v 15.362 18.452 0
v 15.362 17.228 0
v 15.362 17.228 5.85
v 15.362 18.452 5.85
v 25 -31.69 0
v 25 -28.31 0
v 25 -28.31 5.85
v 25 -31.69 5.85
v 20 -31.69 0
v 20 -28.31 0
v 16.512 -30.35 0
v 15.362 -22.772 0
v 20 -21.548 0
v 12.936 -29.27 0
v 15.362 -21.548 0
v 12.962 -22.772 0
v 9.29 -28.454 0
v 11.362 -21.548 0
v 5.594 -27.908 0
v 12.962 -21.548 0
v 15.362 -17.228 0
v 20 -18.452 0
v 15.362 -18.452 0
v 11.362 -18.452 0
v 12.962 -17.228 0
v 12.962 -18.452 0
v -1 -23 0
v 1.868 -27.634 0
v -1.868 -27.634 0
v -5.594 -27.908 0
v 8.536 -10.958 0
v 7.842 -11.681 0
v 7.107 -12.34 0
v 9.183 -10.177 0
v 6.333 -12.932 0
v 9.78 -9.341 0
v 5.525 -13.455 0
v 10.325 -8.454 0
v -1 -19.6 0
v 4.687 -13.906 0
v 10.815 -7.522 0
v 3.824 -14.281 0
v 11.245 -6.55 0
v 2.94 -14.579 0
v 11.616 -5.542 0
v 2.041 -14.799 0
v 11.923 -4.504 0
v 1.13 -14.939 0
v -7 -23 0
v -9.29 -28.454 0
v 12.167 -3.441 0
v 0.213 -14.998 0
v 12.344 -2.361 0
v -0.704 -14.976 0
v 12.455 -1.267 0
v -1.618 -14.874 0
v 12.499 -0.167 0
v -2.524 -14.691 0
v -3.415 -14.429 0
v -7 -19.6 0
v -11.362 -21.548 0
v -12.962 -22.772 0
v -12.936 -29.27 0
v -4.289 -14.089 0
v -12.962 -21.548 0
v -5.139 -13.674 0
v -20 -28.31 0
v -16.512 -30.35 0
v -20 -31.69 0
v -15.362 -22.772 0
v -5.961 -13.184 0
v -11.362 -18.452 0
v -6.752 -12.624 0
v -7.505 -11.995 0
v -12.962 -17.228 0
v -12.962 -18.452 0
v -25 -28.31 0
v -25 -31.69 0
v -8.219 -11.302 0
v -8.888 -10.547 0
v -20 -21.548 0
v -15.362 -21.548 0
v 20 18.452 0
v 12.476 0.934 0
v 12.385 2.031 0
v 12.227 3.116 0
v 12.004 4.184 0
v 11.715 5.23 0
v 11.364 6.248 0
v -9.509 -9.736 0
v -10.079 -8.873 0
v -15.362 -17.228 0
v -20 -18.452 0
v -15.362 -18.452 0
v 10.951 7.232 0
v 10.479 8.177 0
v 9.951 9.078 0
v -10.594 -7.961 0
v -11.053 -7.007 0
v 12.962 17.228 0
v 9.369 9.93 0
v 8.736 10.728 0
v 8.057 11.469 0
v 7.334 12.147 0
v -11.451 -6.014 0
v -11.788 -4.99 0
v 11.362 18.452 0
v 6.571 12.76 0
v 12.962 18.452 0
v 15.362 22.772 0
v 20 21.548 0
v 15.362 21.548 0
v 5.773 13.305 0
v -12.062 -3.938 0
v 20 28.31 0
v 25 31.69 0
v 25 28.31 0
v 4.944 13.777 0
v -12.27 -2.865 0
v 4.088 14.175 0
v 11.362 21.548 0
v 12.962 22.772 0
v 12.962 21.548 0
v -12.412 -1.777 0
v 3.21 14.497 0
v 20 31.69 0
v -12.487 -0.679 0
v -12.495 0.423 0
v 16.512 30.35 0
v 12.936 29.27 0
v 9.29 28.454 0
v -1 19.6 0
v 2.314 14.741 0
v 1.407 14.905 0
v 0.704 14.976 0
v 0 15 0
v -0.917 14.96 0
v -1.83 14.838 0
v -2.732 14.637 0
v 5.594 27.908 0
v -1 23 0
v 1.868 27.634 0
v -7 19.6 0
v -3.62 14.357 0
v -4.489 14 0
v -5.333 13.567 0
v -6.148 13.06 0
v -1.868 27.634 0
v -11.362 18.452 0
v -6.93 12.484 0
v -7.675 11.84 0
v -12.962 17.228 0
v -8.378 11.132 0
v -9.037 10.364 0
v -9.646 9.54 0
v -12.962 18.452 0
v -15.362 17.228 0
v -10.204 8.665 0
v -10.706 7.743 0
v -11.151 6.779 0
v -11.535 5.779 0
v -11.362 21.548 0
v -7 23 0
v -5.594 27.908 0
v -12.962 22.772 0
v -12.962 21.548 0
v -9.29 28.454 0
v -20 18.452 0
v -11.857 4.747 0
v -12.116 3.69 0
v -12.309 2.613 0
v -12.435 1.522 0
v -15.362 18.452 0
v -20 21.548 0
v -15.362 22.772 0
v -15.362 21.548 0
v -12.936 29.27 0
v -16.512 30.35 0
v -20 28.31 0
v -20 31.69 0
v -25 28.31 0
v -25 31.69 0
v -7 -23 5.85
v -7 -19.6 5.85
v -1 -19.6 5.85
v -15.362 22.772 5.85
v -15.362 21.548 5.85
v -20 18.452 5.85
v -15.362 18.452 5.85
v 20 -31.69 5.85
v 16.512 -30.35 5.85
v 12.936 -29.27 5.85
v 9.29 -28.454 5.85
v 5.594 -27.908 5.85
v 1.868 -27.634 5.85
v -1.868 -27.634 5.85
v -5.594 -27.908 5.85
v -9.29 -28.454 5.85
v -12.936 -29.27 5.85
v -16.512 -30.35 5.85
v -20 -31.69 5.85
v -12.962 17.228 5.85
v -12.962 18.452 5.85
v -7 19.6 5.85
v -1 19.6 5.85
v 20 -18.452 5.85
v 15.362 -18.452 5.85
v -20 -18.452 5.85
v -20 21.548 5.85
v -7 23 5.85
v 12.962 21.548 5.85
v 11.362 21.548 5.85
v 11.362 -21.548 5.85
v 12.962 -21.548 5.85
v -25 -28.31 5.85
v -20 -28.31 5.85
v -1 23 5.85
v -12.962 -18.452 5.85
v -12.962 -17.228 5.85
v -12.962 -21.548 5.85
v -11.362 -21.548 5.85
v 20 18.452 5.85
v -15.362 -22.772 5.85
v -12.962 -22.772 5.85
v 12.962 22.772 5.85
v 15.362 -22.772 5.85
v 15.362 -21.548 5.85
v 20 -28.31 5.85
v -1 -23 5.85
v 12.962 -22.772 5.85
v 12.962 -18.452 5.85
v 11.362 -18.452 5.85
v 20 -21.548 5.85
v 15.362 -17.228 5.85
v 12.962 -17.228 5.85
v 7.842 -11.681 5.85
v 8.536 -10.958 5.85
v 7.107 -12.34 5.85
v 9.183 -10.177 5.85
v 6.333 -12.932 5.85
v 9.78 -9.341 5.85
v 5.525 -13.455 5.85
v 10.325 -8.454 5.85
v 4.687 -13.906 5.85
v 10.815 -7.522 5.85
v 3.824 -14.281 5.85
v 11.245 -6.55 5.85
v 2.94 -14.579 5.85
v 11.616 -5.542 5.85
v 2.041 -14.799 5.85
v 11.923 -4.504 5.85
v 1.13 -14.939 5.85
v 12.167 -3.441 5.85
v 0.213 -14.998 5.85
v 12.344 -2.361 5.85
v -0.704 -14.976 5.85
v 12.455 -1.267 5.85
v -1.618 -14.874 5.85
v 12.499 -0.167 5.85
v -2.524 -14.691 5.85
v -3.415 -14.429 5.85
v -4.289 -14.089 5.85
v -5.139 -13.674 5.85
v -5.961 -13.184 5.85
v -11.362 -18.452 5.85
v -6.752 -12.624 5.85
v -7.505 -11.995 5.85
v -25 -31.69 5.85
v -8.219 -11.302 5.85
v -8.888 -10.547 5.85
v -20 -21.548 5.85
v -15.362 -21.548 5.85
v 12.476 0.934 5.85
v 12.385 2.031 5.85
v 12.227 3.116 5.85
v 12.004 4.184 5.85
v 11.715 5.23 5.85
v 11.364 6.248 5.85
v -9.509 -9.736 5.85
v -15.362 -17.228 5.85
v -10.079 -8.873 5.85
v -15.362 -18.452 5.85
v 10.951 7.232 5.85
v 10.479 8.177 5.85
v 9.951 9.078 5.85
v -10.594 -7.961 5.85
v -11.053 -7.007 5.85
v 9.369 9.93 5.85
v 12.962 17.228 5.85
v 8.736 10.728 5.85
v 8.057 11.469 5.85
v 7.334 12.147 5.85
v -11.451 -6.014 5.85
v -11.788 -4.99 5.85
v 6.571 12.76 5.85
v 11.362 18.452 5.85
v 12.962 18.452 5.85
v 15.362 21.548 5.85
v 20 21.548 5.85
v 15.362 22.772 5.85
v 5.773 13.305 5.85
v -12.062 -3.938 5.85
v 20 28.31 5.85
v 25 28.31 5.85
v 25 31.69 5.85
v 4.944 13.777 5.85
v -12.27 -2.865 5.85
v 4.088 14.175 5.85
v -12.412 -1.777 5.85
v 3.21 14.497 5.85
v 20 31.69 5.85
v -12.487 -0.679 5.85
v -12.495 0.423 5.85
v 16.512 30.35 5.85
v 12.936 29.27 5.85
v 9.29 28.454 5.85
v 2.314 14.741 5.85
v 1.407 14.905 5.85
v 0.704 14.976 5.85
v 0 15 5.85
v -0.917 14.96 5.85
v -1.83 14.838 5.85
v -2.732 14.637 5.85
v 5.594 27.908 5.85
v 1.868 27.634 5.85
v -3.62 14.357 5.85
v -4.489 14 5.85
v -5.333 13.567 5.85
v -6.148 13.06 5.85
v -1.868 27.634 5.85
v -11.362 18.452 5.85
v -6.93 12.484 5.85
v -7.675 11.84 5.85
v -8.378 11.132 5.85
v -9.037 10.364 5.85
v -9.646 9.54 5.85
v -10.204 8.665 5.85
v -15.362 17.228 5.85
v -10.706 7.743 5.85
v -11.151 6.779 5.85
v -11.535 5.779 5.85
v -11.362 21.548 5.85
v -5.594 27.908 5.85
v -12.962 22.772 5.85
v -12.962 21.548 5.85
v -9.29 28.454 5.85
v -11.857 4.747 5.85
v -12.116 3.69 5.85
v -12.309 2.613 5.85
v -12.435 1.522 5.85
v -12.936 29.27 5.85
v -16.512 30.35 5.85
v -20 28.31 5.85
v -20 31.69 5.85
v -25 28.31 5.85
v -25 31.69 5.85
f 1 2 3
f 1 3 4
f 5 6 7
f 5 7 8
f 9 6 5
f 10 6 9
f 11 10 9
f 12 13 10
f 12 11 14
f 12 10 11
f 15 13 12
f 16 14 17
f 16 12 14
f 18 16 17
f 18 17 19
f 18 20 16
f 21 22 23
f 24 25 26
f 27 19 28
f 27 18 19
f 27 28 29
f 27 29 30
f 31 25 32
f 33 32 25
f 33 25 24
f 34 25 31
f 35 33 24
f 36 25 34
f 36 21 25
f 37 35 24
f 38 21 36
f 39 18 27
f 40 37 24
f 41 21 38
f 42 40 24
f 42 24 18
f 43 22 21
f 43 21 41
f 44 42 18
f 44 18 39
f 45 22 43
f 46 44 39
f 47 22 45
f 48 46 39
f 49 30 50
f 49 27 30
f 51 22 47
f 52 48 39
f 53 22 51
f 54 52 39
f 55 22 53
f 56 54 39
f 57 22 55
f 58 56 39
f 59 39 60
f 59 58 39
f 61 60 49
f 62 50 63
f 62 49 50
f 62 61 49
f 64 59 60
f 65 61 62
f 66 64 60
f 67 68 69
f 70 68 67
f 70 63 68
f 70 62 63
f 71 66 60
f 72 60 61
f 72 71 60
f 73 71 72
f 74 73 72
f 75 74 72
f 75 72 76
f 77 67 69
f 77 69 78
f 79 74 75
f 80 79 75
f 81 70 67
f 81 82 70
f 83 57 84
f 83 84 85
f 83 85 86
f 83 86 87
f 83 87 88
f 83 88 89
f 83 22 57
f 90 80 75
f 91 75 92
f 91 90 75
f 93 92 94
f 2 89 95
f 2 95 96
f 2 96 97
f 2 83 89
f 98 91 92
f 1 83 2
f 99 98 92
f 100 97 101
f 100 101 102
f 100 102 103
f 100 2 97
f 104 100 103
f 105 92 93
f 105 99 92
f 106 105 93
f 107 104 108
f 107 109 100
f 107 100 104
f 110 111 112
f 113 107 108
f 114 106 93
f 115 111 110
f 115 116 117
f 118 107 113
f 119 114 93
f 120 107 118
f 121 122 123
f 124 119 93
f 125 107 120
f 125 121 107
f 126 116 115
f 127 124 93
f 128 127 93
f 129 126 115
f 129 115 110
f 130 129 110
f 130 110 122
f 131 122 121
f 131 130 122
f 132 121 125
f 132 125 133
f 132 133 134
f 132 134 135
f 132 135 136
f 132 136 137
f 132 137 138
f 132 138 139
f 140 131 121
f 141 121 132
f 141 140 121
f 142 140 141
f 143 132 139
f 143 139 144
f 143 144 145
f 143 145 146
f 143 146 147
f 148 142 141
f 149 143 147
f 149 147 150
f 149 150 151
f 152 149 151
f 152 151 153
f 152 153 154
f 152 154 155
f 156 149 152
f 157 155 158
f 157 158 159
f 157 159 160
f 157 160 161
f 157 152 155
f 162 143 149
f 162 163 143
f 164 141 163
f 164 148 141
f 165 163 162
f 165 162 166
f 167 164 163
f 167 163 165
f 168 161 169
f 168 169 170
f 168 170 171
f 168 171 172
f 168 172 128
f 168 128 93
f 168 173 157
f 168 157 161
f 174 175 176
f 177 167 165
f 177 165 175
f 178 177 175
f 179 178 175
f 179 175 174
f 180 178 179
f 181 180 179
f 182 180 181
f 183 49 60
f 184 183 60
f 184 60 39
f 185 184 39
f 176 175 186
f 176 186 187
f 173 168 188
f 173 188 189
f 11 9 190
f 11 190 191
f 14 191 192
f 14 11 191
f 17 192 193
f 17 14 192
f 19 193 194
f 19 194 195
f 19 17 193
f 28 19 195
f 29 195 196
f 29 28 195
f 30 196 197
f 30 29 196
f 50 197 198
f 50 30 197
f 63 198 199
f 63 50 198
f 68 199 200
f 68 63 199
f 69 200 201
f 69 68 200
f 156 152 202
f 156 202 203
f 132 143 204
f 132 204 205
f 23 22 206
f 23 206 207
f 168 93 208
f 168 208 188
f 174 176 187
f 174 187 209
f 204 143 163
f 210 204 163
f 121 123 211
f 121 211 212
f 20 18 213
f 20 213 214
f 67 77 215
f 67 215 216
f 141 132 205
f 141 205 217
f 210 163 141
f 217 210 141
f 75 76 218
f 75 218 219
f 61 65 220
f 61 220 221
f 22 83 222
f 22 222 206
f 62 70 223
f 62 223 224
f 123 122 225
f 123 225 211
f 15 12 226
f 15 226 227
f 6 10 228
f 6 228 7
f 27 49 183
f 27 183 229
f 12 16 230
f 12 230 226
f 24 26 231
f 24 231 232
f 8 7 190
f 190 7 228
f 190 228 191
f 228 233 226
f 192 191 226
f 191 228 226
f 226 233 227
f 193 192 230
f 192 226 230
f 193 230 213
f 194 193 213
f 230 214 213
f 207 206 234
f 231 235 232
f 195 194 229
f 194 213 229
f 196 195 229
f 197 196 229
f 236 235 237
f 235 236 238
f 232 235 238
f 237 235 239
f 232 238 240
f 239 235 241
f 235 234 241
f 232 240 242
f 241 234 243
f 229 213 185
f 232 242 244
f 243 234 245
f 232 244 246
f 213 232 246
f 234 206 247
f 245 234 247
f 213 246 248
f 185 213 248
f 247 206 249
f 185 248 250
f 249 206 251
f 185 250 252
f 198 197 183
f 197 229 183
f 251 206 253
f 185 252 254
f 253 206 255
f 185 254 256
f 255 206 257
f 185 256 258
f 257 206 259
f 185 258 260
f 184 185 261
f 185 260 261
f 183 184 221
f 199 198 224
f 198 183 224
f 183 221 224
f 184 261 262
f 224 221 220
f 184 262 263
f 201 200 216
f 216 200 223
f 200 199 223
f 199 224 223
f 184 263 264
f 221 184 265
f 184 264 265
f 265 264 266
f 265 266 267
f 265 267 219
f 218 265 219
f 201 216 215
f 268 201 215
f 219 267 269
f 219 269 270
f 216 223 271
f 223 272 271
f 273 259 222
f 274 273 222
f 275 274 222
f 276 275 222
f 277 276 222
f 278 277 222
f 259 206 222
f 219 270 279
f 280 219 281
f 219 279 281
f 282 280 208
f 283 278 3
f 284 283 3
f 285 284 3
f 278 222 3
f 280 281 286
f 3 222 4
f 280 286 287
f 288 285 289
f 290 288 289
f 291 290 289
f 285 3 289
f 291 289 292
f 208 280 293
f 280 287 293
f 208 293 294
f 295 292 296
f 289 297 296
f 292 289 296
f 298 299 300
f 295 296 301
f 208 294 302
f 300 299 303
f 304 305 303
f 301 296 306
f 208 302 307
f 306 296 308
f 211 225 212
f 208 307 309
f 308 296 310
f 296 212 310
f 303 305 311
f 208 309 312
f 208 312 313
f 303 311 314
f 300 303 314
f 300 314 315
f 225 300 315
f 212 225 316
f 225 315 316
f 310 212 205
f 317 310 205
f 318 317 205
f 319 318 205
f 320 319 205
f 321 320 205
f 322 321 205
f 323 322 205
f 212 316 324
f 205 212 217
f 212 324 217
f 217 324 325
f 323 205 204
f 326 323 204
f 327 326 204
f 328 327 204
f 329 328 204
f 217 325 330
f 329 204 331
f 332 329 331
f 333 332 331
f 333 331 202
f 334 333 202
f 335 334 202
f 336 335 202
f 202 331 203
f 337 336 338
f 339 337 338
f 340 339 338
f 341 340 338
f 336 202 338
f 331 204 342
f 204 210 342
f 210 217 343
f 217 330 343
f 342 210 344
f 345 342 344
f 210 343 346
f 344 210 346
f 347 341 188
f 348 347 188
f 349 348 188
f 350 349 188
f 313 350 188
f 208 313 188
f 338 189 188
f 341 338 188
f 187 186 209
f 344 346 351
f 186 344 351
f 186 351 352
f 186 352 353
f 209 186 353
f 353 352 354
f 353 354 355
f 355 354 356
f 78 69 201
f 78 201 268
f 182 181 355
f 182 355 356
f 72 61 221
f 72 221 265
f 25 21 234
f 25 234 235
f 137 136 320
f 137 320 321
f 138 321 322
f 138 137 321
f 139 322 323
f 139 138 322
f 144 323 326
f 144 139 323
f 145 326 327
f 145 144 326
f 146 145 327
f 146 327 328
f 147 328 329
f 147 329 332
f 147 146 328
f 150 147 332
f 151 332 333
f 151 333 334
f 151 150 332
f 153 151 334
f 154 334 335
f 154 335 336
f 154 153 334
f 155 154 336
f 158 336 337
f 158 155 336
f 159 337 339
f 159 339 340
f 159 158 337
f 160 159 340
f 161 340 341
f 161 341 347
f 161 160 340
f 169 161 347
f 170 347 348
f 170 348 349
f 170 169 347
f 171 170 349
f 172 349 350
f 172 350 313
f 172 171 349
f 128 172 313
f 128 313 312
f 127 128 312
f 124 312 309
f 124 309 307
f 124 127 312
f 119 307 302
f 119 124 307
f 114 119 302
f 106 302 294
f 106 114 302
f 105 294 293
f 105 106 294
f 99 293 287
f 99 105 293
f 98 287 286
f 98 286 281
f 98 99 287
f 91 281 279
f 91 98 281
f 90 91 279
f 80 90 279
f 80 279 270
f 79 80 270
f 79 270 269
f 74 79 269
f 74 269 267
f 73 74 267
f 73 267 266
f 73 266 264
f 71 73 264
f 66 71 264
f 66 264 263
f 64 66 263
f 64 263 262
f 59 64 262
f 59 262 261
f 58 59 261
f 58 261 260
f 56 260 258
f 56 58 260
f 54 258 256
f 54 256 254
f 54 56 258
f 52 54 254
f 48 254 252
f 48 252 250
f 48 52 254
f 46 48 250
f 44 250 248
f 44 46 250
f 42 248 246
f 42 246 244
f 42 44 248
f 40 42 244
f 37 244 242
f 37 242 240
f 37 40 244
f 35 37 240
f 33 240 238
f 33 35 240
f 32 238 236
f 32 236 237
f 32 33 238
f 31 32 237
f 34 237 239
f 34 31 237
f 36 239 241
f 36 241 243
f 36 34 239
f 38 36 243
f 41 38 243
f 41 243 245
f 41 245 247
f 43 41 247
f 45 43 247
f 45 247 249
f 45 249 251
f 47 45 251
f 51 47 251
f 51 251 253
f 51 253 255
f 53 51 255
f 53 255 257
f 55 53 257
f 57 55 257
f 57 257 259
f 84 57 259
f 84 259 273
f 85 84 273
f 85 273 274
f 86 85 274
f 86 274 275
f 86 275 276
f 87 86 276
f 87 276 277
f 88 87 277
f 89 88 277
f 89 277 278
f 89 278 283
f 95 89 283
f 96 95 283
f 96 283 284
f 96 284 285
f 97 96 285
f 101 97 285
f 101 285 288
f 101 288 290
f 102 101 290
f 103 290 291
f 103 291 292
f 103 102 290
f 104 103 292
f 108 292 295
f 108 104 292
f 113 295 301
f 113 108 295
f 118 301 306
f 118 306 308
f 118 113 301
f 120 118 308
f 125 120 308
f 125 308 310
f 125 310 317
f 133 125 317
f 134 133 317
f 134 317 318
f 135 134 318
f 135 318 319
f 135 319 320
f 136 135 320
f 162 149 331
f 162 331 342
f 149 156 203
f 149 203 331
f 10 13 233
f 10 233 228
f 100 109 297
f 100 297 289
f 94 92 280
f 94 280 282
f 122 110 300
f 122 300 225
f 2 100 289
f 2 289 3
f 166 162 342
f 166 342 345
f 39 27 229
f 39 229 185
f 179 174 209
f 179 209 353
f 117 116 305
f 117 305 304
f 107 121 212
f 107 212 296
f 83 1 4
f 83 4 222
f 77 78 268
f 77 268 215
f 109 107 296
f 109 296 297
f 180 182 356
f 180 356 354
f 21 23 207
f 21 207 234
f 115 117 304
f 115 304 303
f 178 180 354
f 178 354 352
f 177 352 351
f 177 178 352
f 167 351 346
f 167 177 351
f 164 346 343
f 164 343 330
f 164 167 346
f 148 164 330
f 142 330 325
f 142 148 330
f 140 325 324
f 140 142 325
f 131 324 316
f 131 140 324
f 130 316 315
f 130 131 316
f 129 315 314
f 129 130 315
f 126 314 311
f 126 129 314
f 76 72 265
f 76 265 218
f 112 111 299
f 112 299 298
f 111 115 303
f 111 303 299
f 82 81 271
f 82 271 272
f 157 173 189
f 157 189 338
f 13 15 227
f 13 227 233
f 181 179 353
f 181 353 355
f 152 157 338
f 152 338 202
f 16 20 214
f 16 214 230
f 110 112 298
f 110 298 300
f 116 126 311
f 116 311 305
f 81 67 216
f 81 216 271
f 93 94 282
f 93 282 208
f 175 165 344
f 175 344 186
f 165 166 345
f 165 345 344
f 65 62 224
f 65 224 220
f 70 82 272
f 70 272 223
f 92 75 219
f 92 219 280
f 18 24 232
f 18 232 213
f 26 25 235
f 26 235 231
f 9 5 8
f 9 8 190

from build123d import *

# Parameters (mm, degrees)
SKETCH1_RX          = 15
SKETCH1_RY          = 12.5
SKETCH1_W           = 6
SKETCH1_H           = 3.4
BOSS_EXTRUDE1_DEPTH = 5.85


with BuildPart() as part:
    # Sketch1 → Boss-Extrude1 (new body)
    with BuildSketch(Plane.XY):
        with BuildLine():
            Line((12.961794972, -22.772242018), (15.361794972, -22.772242018))
            Line((15.361794972, -22.772242018), (15.361794972, -21.547840006))
            Line((15.361794972, -21.547840006), (20, -21.547840006))
            Line((20, -21.547840006), (20, -28.31))
            Line((20, -28.31), (25, -28.31))
            Line((25, -28.31), (25, -31.69))
            Line((25, -31.69), (20, -31.69))
            ThreePointArc((20, -31.69), (0, -27.6), (-20, -31.69))
            Line((-20, -31.69), (-25, -31.69))
            Line((-25, -31.69), (-25, -28.31))
            Line((-25, -28.31), (-20, -28.31))
            Line((-20, -28.31), (-20, -21.547840006))
            Line((-20, -21.547840006), (-15.361794972, -21.547840006))
            Line((-15.361794972, -21.547840006), (-15.361794972, -22.772242018))
            Line((-15.361794972, -22.772242018), (-12.961794972, -22.772242018))
            Line((-12.961794972, -22.772242018), (-12.961794972, -21.547840006))
            Line((-12.961794972, -21.547840006), (-11.361794972, -21.547840006))
            Line((-11.361794972, -21.547840006), (-11.361794972, -18.452159994))
            Line((-11.361794972, -18.452159994), (-12.961794972, -18.452159994))
            Line((-12.961794972, -18.452159994), (-12.961794972, -17.227757982))
            Line((-12.961794972, -17.227757982), (-15.361794972, -17.227757982))
            Line((-15.361794972, -17.227757982), (-15.361794972, -18.452159994))
            Line((-15.361794972, -18.452159994), (-20, -18.452159994))
            Line((-20, -18.452159994), (-20, 0))
            Line((-20, 0), (-20, 18.452159994))
            Line((-20, 18.452159994), (-15.361794972, 18.452159994))
            Line((-15.361794972, 18.452159994), (-15.361794972, 17.227757982))
            Line((-15.361794972, 17.227757982), (-12.961794972, 17.227757982))
            Line((-12.961794972, 17.227757982), (-12.961794972, 18.452159994))
            Line((-12.961794972, 18.452159994), (-11.361794972, 18.452159994))
            Line((-11.361794972, 18.452159994), (-11.361794972, 21.547840006))
            Line((-11.361794972, 21.547840006), (-12.961794972, 21.547840006))
            Line((-12.961794972, 21.547840006), (-12.961794972, 22.772242018))
            Line((-12.961794972, 22.772242018), (-15.361794972, 22.772242018))
            Line((-15.361794972, 22.772242018), (-15.361794972, 21.547840006))
            Line((-15.361794972, 21.547840006), (-20, 21.547840006))
            Line((-20, 21.547840006), (-20, 28.31))
            Line((-20, 28.31), (-25, 28.31))
            Line((-25, 28.31), (-25, 31.69))
            Line((-25, 31.69), (-20, 31.69))
            ThreePointArc((-20, 31.69), (0, 27.6), (20, 31.69))
            Line((20, 31.69), (25, 31.69))
            Line((25, 31.69), (25, 28.31))
            Line((25, 28.31), (20, 28.31))
            Line((20, 28.31), (20, 21.547840006))
            Line((20, 21.547840006), (15.361794972, 21.547840006))
            Line((15.361794972, 21.547840006), (15.361794972, 22.772242018))
            Line((15.361794972, 22.772242018), (12.961794972, 22.772242018))
            Line((12.961794972, 22.772242018), (12.961794972, 21.547840006))
            Line((12.961794972, 21.547840006), (11.361794972, 21.547840006))
            Line((11.361794972, 21.547840006), (11.361794972, 18.452159994))
            Line((11.361794972, 18.452159994), (12.961794972, 18.452159994))
            Line((12.961794972, 18.452159994), (12.961794972, 17.227757982))
            Line((12.961794972, 17.227757982), (15.361794972, 17.227757982))
            Line((15.361794972, 17.227757982), (15.361794972, 18.452159994))
            Line((15.361794972, 18.452159994), (20, 18.452159994))
            Line((20, 18.452159994), (20, 0))
            Line((20, 0), (20, -18.452159994))
            Line((20, -18.452159994), (15.361794972, -18.452159994))
            Line((15.361794972, -18.452159994), (15.361794972, -17.227757982))
            Line((15.361794972, -17.227757982), (12.961794972, -17.227757982))
            Line((12.961794972, -17.227757982), (12.961794972, -18.452159994))
            Line((12.961794972, -18.452159994), (11.361794972, -18.452159994))
            Line((11.361794972, -18.452159994), (11.361794972, -21.547840006))
            Line((11.361794972, -21.547840006), (12.961794972, -21.547840006))
            Line((12.961794972, -21.547840006), (12.961794972, -22.772242018))
        make_face()
        with Locations(Location((0, 0), (0, 0, 90))):
            Ellipse(SKETCH1_RX, SKETCH1_RY, mode=Mode.SUBTRACT)
        with Locations((-4, 21.3)):
            Rectangle(SKETCH1_W, SKETCH1_H, mode=Mode.SUBTRACT)
        with Locations((-4, -21.3)):
            Rectangle(SKETCH1_W, SKETCH1_H, mode=Mode.SUBTRACT)
    extrude(amount=BOSS_EXTRUDE1_DEPTH)


solid = part.part
